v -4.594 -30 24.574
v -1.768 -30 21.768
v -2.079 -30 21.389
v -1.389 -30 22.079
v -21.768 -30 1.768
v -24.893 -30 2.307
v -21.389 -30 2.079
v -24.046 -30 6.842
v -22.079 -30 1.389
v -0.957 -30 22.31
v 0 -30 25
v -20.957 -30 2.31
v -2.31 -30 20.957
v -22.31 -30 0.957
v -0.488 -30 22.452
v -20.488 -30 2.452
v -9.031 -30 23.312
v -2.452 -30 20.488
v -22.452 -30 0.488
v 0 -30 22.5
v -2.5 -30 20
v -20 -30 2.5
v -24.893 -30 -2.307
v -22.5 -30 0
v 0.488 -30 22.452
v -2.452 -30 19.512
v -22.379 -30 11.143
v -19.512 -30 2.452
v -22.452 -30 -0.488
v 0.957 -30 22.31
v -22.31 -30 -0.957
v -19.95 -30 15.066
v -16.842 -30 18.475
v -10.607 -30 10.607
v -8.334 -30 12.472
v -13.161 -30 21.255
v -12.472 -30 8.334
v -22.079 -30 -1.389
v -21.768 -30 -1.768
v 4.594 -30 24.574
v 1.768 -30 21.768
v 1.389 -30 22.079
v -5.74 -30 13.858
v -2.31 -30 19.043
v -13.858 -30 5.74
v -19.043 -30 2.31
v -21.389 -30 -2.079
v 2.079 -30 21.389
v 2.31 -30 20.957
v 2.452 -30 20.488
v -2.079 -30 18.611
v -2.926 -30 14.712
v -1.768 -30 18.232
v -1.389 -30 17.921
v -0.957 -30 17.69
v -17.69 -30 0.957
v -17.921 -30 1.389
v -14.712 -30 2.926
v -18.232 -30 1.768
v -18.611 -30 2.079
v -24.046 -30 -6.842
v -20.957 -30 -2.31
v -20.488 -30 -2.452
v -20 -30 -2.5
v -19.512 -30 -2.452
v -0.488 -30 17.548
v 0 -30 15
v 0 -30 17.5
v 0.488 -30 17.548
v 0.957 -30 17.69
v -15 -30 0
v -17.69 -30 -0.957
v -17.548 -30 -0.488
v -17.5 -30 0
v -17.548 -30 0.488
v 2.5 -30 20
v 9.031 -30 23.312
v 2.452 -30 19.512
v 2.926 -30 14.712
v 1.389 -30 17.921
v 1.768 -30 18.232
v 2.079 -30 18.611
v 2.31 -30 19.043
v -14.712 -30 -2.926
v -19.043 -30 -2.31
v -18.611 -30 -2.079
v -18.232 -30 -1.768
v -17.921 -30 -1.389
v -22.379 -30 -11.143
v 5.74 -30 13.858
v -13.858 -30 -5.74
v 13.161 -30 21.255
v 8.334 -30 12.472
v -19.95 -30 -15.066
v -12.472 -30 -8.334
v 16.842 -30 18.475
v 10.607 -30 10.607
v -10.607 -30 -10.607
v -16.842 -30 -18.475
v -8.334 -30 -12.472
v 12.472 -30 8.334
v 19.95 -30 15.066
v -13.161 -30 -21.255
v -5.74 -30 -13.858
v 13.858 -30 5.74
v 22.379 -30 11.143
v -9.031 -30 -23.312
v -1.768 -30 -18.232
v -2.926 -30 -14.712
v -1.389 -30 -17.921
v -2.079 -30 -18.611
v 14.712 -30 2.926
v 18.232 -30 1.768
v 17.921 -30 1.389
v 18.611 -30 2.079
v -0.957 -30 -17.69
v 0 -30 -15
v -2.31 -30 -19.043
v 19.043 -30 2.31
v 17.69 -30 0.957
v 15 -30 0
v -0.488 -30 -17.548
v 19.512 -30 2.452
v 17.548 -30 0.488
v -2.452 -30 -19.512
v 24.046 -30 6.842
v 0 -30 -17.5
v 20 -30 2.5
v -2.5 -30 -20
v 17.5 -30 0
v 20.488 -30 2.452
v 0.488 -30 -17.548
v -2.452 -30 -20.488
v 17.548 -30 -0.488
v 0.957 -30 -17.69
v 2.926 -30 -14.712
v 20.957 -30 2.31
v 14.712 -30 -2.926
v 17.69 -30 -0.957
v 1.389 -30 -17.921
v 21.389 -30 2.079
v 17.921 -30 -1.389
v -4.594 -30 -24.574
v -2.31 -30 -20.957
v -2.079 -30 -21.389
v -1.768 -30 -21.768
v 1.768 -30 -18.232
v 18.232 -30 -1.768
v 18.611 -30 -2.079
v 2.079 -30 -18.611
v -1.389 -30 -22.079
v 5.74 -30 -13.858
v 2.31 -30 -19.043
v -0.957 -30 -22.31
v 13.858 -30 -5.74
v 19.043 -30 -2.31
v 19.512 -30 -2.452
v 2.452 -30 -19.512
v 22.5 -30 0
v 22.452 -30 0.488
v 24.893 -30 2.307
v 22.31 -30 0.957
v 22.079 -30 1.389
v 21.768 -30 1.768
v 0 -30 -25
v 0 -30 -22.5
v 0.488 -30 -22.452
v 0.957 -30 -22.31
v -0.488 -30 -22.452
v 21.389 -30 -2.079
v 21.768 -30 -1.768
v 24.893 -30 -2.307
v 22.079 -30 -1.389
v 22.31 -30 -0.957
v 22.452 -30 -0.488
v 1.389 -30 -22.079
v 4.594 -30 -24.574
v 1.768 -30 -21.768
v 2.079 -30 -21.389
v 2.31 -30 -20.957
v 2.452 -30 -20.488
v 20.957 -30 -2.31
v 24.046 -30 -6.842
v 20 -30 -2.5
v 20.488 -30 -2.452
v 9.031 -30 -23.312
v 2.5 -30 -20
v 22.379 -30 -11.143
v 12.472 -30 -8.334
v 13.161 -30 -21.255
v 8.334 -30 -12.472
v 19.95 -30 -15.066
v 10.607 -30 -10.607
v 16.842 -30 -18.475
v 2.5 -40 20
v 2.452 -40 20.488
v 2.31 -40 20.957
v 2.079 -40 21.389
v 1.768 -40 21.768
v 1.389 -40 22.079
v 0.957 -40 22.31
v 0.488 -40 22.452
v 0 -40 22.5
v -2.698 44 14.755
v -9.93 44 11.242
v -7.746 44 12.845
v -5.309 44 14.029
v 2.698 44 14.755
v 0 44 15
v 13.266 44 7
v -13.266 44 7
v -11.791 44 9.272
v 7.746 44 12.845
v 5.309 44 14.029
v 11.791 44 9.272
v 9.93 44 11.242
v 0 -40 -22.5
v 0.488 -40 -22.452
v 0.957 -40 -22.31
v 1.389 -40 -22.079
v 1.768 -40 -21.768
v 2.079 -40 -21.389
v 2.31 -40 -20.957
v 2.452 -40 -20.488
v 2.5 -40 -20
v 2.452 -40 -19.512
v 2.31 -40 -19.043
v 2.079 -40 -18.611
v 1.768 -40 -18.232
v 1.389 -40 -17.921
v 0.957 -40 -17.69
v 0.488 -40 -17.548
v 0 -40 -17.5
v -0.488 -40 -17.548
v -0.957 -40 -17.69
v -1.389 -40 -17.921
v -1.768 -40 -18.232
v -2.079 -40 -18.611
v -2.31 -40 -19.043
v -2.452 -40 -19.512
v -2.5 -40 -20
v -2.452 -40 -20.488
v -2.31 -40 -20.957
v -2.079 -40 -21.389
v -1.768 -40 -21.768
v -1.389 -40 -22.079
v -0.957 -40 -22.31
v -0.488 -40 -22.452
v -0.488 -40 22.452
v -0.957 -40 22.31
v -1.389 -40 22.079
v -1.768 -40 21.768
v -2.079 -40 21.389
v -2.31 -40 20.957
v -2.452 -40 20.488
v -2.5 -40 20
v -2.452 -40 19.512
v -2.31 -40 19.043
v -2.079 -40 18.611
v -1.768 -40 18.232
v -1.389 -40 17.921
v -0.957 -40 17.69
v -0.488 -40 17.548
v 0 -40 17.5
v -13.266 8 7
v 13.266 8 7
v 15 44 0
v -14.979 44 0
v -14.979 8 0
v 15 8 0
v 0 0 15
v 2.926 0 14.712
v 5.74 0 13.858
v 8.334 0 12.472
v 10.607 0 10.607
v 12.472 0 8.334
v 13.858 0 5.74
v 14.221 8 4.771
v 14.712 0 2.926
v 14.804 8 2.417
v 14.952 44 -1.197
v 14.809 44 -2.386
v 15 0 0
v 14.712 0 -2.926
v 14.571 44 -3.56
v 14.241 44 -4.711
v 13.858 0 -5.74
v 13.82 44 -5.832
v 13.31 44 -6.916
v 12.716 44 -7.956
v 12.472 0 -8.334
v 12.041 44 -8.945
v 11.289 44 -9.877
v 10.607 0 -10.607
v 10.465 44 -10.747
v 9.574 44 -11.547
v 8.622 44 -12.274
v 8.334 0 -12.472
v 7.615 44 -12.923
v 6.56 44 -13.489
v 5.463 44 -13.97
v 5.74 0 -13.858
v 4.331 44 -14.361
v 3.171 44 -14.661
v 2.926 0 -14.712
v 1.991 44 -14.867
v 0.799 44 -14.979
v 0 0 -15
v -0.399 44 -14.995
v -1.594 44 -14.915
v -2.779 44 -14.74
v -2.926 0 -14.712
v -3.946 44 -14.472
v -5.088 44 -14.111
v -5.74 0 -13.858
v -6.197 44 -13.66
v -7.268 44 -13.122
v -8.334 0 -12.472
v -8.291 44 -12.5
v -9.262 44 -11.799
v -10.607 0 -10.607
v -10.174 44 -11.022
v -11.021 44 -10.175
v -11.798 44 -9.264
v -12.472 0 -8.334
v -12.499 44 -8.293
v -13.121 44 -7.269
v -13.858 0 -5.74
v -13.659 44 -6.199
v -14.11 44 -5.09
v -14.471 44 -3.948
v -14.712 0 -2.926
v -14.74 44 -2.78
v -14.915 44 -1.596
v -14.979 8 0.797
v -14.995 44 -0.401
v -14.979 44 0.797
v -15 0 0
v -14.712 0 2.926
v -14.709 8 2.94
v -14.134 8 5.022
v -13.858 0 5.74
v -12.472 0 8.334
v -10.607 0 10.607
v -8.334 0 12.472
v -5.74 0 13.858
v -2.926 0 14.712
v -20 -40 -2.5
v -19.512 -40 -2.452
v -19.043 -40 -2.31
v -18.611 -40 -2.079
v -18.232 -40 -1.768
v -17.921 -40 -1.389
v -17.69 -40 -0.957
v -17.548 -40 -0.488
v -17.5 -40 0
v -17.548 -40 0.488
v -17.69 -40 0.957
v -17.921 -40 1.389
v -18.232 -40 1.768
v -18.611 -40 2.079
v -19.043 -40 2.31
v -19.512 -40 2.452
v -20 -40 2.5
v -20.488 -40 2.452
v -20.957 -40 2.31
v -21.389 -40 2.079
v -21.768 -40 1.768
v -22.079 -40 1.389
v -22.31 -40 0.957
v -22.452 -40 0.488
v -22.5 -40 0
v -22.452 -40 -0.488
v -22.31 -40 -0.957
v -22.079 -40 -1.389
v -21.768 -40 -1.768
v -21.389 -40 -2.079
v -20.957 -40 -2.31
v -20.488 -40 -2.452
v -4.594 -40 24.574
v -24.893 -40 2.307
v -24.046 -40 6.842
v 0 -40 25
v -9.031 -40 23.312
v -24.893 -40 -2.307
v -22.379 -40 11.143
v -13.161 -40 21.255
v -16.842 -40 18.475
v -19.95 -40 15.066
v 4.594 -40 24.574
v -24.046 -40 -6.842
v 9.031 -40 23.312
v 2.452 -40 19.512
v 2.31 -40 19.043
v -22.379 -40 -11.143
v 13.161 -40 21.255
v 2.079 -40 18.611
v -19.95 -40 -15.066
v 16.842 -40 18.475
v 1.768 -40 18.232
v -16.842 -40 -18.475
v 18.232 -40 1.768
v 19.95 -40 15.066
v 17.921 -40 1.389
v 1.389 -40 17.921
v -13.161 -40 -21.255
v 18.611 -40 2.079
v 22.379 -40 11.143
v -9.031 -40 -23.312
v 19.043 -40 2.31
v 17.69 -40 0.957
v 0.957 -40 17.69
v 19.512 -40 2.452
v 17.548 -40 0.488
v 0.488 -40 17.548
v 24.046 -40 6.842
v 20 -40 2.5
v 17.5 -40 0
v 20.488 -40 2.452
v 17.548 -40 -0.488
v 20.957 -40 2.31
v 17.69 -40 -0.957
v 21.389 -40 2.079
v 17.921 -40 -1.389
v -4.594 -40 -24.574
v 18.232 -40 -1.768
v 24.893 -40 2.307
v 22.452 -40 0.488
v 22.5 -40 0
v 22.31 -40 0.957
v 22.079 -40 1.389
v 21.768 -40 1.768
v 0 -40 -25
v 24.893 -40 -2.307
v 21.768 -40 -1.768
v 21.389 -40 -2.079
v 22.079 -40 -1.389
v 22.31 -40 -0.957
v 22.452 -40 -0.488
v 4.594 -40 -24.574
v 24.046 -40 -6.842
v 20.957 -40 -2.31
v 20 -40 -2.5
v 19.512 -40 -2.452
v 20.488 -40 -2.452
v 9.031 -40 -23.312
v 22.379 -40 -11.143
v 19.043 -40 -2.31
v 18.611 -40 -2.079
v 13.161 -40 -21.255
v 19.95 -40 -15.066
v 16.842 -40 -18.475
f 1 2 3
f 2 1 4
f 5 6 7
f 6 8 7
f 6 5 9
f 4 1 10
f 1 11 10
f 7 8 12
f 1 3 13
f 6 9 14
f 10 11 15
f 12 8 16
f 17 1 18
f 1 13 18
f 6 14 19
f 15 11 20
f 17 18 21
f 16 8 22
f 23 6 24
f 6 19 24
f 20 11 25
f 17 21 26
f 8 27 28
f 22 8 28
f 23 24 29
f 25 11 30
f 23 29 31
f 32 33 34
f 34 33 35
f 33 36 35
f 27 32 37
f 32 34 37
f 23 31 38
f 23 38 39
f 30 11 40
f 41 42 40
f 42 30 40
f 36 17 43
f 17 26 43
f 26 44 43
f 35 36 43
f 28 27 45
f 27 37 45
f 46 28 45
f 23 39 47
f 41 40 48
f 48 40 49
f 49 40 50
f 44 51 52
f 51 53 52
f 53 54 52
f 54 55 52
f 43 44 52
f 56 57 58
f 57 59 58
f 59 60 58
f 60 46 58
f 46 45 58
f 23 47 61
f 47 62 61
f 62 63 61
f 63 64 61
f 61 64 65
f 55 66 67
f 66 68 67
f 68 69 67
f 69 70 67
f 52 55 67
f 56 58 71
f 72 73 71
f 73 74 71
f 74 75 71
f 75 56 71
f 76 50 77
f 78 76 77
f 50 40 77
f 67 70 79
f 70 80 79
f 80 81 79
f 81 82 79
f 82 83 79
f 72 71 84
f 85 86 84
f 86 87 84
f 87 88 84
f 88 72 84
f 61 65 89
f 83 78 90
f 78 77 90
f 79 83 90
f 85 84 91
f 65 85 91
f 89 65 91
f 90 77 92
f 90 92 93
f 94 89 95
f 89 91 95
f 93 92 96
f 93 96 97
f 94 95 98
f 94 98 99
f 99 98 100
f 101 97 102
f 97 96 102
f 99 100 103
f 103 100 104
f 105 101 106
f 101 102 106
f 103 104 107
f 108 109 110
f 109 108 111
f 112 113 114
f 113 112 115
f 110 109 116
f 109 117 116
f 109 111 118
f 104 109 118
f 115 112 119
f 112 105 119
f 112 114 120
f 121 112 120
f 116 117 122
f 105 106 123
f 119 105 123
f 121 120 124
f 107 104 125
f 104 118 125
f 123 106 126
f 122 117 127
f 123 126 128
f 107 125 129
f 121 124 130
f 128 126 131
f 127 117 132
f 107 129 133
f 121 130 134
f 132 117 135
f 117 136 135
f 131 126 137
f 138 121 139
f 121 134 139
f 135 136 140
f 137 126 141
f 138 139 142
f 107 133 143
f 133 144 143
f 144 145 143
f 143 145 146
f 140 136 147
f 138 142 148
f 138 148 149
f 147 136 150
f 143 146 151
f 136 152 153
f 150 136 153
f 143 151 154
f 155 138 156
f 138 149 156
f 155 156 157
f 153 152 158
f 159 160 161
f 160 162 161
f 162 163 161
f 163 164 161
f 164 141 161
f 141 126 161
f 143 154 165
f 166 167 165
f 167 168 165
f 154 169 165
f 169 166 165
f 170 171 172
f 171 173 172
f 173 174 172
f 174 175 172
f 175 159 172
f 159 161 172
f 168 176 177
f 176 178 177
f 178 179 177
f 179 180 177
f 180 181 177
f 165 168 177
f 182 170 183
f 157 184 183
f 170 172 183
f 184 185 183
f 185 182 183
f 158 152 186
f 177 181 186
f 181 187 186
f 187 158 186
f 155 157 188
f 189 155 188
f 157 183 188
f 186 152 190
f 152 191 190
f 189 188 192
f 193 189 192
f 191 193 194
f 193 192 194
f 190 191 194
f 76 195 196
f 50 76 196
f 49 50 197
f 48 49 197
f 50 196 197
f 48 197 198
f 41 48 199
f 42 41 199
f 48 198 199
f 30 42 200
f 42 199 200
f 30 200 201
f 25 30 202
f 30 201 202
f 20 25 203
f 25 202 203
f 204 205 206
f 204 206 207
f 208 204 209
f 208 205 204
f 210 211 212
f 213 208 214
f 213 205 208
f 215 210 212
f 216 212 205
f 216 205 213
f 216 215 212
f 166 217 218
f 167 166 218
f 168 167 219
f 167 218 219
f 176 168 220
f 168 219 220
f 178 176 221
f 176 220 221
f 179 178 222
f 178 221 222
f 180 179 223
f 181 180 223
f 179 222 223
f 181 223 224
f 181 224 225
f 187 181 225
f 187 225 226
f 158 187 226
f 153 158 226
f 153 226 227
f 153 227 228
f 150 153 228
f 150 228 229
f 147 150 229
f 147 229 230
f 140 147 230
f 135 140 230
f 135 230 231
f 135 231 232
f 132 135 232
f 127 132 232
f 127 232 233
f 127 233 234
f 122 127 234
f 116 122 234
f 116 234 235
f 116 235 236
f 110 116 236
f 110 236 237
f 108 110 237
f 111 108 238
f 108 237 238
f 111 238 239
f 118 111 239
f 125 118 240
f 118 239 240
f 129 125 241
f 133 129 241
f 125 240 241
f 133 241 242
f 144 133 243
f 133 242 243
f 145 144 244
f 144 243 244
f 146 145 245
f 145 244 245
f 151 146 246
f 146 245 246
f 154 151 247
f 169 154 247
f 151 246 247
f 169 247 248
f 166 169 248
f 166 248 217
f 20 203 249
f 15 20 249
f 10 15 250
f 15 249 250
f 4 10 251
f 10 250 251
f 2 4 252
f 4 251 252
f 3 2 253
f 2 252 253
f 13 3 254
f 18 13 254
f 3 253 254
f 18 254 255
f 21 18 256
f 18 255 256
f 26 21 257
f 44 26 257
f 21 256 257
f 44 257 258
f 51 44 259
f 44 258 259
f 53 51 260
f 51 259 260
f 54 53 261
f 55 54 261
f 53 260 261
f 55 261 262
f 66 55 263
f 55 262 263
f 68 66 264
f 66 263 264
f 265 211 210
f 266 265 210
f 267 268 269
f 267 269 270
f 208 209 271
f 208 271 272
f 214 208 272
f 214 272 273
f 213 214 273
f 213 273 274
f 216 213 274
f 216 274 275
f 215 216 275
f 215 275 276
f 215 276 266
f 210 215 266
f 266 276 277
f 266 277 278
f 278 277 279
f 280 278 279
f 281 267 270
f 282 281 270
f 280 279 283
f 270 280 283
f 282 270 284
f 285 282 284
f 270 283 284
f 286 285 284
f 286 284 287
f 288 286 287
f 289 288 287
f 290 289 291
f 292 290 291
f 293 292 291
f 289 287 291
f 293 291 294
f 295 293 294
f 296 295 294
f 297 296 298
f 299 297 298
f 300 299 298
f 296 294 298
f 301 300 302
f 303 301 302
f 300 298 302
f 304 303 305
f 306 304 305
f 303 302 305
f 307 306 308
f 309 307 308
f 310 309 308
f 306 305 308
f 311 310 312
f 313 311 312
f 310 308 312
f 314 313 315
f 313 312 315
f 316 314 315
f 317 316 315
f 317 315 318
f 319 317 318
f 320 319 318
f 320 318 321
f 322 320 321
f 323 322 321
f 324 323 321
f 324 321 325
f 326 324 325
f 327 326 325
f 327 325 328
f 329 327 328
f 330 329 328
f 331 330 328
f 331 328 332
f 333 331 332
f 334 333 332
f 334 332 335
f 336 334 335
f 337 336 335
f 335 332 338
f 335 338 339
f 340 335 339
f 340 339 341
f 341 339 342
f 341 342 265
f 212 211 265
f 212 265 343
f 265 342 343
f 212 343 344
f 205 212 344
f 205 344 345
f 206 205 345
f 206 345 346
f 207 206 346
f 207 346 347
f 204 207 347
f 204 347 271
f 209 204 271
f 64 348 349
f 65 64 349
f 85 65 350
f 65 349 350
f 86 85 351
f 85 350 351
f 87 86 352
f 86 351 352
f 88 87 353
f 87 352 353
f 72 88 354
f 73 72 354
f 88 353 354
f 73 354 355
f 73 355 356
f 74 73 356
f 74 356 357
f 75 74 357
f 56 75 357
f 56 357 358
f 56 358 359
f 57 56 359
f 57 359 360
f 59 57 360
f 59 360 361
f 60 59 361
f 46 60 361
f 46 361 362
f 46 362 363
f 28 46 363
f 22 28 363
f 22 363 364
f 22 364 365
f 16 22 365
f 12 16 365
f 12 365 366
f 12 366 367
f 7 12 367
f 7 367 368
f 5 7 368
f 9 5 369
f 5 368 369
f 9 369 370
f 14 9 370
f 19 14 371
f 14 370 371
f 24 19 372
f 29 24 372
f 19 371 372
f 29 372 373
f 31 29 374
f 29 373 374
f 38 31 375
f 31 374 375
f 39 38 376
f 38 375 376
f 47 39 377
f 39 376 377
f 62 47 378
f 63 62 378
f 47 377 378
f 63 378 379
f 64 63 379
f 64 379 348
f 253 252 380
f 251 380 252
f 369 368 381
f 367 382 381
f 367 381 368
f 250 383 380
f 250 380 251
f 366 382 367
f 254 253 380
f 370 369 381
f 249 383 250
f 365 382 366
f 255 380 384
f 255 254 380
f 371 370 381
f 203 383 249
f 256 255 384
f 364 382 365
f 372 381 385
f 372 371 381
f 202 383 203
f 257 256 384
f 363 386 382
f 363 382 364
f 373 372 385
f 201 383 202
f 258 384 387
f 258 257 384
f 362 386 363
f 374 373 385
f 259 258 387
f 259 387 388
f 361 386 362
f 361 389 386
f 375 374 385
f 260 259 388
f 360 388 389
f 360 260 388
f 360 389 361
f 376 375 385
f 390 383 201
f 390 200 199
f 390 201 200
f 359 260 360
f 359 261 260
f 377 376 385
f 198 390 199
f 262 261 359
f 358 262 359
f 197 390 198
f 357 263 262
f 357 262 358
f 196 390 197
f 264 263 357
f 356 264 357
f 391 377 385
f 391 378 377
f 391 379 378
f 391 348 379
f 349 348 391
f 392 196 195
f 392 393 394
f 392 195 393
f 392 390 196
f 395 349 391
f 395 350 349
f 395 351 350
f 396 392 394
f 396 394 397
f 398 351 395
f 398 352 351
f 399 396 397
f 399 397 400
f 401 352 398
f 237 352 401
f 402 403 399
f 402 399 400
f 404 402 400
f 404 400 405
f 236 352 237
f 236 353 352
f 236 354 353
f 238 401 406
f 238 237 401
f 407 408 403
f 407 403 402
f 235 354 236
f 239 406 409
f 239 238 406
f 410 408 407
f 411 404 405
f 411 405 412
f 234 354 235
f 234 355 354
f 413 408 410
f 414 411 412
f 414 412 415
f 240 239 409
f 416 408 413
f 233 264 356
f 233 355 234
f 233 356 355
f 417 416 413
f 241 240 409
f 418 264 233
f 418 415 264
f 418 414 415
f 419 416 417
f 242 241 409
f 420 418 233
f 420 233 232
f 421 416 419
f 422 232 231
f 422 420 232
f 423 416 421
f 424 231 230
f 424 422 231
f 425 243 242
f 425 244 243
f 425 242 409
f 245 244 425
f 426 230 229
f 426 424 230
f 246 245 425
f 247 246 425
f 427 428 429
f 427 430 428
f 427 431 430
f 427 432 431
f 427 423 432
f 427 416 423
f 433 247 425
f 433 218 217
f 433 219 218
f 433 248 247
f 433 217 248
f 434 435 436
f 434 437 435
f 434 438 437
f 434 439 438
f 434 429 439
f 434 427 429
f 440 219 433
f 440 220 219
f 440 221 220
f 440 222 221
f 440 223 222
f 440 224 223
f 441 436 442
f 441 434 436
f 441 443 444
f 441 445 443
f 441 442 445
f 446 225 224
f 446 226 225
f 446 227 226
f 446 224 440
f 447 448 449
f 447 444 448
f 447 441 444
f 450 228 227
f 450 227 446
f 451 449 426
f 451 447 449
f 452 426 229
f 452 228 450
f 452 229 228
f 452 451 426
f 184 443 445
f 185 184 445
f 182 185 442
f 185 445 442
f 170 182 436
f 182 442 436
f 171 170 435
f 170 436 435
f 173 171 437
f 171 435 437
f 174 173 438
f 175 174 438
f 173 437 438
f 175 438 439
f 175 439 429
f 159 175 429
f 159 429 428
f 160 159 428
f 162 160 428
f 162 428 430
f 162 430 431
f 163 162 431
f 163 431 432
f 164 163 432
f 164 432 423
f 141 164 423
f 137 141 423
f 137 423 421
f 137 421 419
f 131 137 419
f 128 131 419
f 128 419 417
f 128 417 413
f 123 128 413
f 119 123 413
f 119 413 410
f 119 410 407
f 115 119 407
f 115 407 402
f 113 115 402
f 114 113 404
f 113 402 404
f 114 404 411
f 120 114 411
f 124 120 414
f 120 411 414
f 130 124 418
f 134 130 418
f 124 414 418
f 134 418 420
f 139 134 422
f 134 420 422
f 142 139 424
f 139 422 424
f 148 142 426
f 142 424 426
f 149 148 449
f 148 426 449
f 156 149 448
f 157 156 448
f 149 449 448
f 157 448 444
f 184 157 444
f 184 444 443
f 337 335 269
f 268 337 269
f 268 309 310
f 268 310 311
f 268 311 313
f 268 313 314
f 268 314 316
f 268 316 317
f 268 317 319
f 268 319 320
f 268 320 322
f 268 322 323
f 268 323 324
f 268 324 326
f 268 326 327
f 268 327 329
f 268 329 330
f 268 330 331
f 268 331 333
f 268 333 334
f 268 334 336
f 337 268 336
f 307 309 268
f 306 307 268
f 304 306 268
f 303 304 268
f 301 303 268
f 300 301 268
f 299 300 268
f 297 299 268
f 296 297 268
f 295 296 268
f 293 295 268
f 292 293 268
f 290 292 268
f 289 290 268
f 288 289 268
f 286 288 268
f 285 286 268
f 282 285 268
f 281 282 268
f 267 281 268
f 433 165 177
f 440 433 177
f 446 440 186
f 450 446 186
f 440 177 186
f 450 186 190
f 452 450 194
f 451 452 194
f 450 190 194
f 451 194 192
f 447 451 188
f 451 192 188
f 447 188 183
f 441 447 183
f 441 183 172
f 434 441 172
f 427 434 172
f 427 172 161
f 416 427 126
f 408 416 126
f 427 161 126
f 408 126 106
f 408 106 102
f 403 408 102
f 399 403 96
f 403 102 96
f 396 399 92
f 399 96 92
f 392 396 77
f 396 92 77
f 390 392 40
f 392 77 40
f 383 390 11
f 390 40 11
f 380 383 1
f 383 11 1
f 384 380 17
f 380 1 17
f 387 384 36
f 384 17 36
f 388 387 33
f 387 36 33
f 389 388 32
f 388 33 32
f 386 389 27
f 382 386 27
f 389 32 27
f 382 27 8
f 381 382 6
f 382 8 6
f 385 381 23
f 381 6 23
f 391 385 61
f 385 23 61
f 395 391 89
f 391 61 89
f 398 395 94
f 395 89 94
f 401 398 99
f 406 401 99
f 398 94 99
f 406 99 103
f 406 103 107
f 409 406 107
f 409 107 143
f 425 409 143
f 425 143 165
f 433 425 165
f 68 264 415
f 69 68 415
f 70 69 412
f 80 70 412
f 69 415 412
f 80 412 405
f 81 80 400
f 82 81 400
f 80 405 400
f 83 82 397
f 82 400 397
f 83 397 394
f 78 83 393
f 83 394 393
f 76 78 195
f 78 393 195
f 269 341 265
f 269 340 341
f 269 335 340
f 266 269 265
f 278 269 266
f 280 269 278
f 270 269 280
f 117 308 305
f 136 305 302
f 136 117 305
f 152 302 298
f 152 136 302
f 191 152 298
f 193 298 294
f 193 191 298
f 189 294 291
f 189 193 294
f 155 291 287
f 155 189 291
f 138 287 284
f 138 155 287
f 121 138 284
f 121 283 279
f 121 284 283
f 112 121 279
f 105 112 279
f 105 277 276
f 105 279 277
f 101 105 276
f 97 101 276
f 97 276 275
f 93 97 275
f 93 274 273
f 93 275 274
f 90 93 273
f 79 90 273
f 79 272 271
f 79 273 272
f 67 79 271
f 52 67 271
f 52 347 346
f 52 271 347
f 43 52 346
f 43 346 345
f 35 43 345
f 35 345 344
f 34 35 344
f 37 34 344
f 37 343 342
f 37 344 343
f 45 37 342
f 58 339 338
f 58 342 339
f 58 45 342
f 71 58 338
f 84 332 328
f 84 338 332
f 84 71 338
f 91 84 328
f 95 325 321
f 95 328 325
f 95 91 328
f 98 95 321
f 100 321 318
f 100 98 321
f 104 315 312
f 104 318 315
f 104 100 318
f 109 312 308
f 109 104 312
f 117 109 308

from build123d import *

# Parameters (mm, degrees)
SKETCH1_R           = 15
BOSS_EXTRUDE1_DEPTH = 44
SKETCH2_W           = 29.978808487
SKETCH2_H           = 7
CUT_EXTRUDE1_DEPTH  = 36
BOSS_EXTRUDE2_START = 30
SKETCH4_R           = 15
BOSS_EXTRUDE2_DEPTH = 30
SKETCH5_R           = 25
BOSS_EXTRUDE3_DEPTH = 10
SKETCH6_R           = 2.5
CUT_EXTRUDE2_DEPTH  = 92.137259121


with BuildPart() as part:
    # Sketch1 → Boss-Extrude1 (new body)
    with BuildSketch(Plane(origin=(0, 0, 0), x_dir=(1, 0, 0), z_dir=(0, 1, 0))):
        with Locations(Location((0, 0, 0), (0, 0, 270))):
            Circle(SKETCH1_R)
    extrude(amount=BOSS_EXTRUDE1_DEPTH)

    # Sketch2 → Cut-Extrude1 (cut)
    with BuildSketch(Plane(origin=(0, 44, 0), x_dir=(1, 0, 0), z_dir=(0, 1, 0))):
        with Locations((0.010595757, -3.5)):
            Rectangle(SKETCH2_W, SKETCH2_H)
    extrude(amount=-CUT_EXTRUDE1_DEPTH, mode=Mode.SUBTRACT)

    # Sketch4 → Boss-Extrude2 (add)
    with BuildSketch(Plane.XZ.offset(BOSS_EXTRUDE2_START)):
        with Locations(Location((0, 0, 0), (0, 0, 270))):
            Circle(SKETCH4_R)
    extrude(amount=-BOSS_EXTRUDE2_DEPTH)

    # Sketch5 → Boss-Extrude3 (add)
    with BuildSketch(Plane.XZ.offset(30)):
        with Locations(Location((0, 0, 0), (0, 0, 270))):
            Circle(SKETCH5_R)
    extrude(amount=BOSS_EXTRUDE3_DEPTH)

    # Sketch6 → Cut-Extrude2 (cut, through all)
    with BuildSketch(Plane.XZ.offset(40)):
        with BuildLine():
            ThreePointArc((0, 22.5), (-2.5, 20), (0, 17.5))
            Line((0, 17.5), (0, 22.5))
        make_face()
        with BuildLine():
            Line((0, 22.5), (0, 17.5))
            ThreePointArc((0, 17.5), (1.767766953, 18.232233047), (2.5, 20))
            ThreePointArc((2.5, 20), (1.767766953, 21.767766953), (0, 22.5))
        make_face()
        with Locations(Location((20, 0, 0), (0, 0, 270))):
            Circle(SKETCH6_R)
        with Locations(Location((0, -20, 0), (0, 0, 270))):
            Circle(SKETCH6_R)
        with Locations(Location((-20, 0, 0), (0, 0, 270))):
            Circle(SKETCH6_R)
    extrude(amount=-CUT_EXTRUDE2_DEPTH, mode=Mode.SUBTRACT)


solid = part.part
